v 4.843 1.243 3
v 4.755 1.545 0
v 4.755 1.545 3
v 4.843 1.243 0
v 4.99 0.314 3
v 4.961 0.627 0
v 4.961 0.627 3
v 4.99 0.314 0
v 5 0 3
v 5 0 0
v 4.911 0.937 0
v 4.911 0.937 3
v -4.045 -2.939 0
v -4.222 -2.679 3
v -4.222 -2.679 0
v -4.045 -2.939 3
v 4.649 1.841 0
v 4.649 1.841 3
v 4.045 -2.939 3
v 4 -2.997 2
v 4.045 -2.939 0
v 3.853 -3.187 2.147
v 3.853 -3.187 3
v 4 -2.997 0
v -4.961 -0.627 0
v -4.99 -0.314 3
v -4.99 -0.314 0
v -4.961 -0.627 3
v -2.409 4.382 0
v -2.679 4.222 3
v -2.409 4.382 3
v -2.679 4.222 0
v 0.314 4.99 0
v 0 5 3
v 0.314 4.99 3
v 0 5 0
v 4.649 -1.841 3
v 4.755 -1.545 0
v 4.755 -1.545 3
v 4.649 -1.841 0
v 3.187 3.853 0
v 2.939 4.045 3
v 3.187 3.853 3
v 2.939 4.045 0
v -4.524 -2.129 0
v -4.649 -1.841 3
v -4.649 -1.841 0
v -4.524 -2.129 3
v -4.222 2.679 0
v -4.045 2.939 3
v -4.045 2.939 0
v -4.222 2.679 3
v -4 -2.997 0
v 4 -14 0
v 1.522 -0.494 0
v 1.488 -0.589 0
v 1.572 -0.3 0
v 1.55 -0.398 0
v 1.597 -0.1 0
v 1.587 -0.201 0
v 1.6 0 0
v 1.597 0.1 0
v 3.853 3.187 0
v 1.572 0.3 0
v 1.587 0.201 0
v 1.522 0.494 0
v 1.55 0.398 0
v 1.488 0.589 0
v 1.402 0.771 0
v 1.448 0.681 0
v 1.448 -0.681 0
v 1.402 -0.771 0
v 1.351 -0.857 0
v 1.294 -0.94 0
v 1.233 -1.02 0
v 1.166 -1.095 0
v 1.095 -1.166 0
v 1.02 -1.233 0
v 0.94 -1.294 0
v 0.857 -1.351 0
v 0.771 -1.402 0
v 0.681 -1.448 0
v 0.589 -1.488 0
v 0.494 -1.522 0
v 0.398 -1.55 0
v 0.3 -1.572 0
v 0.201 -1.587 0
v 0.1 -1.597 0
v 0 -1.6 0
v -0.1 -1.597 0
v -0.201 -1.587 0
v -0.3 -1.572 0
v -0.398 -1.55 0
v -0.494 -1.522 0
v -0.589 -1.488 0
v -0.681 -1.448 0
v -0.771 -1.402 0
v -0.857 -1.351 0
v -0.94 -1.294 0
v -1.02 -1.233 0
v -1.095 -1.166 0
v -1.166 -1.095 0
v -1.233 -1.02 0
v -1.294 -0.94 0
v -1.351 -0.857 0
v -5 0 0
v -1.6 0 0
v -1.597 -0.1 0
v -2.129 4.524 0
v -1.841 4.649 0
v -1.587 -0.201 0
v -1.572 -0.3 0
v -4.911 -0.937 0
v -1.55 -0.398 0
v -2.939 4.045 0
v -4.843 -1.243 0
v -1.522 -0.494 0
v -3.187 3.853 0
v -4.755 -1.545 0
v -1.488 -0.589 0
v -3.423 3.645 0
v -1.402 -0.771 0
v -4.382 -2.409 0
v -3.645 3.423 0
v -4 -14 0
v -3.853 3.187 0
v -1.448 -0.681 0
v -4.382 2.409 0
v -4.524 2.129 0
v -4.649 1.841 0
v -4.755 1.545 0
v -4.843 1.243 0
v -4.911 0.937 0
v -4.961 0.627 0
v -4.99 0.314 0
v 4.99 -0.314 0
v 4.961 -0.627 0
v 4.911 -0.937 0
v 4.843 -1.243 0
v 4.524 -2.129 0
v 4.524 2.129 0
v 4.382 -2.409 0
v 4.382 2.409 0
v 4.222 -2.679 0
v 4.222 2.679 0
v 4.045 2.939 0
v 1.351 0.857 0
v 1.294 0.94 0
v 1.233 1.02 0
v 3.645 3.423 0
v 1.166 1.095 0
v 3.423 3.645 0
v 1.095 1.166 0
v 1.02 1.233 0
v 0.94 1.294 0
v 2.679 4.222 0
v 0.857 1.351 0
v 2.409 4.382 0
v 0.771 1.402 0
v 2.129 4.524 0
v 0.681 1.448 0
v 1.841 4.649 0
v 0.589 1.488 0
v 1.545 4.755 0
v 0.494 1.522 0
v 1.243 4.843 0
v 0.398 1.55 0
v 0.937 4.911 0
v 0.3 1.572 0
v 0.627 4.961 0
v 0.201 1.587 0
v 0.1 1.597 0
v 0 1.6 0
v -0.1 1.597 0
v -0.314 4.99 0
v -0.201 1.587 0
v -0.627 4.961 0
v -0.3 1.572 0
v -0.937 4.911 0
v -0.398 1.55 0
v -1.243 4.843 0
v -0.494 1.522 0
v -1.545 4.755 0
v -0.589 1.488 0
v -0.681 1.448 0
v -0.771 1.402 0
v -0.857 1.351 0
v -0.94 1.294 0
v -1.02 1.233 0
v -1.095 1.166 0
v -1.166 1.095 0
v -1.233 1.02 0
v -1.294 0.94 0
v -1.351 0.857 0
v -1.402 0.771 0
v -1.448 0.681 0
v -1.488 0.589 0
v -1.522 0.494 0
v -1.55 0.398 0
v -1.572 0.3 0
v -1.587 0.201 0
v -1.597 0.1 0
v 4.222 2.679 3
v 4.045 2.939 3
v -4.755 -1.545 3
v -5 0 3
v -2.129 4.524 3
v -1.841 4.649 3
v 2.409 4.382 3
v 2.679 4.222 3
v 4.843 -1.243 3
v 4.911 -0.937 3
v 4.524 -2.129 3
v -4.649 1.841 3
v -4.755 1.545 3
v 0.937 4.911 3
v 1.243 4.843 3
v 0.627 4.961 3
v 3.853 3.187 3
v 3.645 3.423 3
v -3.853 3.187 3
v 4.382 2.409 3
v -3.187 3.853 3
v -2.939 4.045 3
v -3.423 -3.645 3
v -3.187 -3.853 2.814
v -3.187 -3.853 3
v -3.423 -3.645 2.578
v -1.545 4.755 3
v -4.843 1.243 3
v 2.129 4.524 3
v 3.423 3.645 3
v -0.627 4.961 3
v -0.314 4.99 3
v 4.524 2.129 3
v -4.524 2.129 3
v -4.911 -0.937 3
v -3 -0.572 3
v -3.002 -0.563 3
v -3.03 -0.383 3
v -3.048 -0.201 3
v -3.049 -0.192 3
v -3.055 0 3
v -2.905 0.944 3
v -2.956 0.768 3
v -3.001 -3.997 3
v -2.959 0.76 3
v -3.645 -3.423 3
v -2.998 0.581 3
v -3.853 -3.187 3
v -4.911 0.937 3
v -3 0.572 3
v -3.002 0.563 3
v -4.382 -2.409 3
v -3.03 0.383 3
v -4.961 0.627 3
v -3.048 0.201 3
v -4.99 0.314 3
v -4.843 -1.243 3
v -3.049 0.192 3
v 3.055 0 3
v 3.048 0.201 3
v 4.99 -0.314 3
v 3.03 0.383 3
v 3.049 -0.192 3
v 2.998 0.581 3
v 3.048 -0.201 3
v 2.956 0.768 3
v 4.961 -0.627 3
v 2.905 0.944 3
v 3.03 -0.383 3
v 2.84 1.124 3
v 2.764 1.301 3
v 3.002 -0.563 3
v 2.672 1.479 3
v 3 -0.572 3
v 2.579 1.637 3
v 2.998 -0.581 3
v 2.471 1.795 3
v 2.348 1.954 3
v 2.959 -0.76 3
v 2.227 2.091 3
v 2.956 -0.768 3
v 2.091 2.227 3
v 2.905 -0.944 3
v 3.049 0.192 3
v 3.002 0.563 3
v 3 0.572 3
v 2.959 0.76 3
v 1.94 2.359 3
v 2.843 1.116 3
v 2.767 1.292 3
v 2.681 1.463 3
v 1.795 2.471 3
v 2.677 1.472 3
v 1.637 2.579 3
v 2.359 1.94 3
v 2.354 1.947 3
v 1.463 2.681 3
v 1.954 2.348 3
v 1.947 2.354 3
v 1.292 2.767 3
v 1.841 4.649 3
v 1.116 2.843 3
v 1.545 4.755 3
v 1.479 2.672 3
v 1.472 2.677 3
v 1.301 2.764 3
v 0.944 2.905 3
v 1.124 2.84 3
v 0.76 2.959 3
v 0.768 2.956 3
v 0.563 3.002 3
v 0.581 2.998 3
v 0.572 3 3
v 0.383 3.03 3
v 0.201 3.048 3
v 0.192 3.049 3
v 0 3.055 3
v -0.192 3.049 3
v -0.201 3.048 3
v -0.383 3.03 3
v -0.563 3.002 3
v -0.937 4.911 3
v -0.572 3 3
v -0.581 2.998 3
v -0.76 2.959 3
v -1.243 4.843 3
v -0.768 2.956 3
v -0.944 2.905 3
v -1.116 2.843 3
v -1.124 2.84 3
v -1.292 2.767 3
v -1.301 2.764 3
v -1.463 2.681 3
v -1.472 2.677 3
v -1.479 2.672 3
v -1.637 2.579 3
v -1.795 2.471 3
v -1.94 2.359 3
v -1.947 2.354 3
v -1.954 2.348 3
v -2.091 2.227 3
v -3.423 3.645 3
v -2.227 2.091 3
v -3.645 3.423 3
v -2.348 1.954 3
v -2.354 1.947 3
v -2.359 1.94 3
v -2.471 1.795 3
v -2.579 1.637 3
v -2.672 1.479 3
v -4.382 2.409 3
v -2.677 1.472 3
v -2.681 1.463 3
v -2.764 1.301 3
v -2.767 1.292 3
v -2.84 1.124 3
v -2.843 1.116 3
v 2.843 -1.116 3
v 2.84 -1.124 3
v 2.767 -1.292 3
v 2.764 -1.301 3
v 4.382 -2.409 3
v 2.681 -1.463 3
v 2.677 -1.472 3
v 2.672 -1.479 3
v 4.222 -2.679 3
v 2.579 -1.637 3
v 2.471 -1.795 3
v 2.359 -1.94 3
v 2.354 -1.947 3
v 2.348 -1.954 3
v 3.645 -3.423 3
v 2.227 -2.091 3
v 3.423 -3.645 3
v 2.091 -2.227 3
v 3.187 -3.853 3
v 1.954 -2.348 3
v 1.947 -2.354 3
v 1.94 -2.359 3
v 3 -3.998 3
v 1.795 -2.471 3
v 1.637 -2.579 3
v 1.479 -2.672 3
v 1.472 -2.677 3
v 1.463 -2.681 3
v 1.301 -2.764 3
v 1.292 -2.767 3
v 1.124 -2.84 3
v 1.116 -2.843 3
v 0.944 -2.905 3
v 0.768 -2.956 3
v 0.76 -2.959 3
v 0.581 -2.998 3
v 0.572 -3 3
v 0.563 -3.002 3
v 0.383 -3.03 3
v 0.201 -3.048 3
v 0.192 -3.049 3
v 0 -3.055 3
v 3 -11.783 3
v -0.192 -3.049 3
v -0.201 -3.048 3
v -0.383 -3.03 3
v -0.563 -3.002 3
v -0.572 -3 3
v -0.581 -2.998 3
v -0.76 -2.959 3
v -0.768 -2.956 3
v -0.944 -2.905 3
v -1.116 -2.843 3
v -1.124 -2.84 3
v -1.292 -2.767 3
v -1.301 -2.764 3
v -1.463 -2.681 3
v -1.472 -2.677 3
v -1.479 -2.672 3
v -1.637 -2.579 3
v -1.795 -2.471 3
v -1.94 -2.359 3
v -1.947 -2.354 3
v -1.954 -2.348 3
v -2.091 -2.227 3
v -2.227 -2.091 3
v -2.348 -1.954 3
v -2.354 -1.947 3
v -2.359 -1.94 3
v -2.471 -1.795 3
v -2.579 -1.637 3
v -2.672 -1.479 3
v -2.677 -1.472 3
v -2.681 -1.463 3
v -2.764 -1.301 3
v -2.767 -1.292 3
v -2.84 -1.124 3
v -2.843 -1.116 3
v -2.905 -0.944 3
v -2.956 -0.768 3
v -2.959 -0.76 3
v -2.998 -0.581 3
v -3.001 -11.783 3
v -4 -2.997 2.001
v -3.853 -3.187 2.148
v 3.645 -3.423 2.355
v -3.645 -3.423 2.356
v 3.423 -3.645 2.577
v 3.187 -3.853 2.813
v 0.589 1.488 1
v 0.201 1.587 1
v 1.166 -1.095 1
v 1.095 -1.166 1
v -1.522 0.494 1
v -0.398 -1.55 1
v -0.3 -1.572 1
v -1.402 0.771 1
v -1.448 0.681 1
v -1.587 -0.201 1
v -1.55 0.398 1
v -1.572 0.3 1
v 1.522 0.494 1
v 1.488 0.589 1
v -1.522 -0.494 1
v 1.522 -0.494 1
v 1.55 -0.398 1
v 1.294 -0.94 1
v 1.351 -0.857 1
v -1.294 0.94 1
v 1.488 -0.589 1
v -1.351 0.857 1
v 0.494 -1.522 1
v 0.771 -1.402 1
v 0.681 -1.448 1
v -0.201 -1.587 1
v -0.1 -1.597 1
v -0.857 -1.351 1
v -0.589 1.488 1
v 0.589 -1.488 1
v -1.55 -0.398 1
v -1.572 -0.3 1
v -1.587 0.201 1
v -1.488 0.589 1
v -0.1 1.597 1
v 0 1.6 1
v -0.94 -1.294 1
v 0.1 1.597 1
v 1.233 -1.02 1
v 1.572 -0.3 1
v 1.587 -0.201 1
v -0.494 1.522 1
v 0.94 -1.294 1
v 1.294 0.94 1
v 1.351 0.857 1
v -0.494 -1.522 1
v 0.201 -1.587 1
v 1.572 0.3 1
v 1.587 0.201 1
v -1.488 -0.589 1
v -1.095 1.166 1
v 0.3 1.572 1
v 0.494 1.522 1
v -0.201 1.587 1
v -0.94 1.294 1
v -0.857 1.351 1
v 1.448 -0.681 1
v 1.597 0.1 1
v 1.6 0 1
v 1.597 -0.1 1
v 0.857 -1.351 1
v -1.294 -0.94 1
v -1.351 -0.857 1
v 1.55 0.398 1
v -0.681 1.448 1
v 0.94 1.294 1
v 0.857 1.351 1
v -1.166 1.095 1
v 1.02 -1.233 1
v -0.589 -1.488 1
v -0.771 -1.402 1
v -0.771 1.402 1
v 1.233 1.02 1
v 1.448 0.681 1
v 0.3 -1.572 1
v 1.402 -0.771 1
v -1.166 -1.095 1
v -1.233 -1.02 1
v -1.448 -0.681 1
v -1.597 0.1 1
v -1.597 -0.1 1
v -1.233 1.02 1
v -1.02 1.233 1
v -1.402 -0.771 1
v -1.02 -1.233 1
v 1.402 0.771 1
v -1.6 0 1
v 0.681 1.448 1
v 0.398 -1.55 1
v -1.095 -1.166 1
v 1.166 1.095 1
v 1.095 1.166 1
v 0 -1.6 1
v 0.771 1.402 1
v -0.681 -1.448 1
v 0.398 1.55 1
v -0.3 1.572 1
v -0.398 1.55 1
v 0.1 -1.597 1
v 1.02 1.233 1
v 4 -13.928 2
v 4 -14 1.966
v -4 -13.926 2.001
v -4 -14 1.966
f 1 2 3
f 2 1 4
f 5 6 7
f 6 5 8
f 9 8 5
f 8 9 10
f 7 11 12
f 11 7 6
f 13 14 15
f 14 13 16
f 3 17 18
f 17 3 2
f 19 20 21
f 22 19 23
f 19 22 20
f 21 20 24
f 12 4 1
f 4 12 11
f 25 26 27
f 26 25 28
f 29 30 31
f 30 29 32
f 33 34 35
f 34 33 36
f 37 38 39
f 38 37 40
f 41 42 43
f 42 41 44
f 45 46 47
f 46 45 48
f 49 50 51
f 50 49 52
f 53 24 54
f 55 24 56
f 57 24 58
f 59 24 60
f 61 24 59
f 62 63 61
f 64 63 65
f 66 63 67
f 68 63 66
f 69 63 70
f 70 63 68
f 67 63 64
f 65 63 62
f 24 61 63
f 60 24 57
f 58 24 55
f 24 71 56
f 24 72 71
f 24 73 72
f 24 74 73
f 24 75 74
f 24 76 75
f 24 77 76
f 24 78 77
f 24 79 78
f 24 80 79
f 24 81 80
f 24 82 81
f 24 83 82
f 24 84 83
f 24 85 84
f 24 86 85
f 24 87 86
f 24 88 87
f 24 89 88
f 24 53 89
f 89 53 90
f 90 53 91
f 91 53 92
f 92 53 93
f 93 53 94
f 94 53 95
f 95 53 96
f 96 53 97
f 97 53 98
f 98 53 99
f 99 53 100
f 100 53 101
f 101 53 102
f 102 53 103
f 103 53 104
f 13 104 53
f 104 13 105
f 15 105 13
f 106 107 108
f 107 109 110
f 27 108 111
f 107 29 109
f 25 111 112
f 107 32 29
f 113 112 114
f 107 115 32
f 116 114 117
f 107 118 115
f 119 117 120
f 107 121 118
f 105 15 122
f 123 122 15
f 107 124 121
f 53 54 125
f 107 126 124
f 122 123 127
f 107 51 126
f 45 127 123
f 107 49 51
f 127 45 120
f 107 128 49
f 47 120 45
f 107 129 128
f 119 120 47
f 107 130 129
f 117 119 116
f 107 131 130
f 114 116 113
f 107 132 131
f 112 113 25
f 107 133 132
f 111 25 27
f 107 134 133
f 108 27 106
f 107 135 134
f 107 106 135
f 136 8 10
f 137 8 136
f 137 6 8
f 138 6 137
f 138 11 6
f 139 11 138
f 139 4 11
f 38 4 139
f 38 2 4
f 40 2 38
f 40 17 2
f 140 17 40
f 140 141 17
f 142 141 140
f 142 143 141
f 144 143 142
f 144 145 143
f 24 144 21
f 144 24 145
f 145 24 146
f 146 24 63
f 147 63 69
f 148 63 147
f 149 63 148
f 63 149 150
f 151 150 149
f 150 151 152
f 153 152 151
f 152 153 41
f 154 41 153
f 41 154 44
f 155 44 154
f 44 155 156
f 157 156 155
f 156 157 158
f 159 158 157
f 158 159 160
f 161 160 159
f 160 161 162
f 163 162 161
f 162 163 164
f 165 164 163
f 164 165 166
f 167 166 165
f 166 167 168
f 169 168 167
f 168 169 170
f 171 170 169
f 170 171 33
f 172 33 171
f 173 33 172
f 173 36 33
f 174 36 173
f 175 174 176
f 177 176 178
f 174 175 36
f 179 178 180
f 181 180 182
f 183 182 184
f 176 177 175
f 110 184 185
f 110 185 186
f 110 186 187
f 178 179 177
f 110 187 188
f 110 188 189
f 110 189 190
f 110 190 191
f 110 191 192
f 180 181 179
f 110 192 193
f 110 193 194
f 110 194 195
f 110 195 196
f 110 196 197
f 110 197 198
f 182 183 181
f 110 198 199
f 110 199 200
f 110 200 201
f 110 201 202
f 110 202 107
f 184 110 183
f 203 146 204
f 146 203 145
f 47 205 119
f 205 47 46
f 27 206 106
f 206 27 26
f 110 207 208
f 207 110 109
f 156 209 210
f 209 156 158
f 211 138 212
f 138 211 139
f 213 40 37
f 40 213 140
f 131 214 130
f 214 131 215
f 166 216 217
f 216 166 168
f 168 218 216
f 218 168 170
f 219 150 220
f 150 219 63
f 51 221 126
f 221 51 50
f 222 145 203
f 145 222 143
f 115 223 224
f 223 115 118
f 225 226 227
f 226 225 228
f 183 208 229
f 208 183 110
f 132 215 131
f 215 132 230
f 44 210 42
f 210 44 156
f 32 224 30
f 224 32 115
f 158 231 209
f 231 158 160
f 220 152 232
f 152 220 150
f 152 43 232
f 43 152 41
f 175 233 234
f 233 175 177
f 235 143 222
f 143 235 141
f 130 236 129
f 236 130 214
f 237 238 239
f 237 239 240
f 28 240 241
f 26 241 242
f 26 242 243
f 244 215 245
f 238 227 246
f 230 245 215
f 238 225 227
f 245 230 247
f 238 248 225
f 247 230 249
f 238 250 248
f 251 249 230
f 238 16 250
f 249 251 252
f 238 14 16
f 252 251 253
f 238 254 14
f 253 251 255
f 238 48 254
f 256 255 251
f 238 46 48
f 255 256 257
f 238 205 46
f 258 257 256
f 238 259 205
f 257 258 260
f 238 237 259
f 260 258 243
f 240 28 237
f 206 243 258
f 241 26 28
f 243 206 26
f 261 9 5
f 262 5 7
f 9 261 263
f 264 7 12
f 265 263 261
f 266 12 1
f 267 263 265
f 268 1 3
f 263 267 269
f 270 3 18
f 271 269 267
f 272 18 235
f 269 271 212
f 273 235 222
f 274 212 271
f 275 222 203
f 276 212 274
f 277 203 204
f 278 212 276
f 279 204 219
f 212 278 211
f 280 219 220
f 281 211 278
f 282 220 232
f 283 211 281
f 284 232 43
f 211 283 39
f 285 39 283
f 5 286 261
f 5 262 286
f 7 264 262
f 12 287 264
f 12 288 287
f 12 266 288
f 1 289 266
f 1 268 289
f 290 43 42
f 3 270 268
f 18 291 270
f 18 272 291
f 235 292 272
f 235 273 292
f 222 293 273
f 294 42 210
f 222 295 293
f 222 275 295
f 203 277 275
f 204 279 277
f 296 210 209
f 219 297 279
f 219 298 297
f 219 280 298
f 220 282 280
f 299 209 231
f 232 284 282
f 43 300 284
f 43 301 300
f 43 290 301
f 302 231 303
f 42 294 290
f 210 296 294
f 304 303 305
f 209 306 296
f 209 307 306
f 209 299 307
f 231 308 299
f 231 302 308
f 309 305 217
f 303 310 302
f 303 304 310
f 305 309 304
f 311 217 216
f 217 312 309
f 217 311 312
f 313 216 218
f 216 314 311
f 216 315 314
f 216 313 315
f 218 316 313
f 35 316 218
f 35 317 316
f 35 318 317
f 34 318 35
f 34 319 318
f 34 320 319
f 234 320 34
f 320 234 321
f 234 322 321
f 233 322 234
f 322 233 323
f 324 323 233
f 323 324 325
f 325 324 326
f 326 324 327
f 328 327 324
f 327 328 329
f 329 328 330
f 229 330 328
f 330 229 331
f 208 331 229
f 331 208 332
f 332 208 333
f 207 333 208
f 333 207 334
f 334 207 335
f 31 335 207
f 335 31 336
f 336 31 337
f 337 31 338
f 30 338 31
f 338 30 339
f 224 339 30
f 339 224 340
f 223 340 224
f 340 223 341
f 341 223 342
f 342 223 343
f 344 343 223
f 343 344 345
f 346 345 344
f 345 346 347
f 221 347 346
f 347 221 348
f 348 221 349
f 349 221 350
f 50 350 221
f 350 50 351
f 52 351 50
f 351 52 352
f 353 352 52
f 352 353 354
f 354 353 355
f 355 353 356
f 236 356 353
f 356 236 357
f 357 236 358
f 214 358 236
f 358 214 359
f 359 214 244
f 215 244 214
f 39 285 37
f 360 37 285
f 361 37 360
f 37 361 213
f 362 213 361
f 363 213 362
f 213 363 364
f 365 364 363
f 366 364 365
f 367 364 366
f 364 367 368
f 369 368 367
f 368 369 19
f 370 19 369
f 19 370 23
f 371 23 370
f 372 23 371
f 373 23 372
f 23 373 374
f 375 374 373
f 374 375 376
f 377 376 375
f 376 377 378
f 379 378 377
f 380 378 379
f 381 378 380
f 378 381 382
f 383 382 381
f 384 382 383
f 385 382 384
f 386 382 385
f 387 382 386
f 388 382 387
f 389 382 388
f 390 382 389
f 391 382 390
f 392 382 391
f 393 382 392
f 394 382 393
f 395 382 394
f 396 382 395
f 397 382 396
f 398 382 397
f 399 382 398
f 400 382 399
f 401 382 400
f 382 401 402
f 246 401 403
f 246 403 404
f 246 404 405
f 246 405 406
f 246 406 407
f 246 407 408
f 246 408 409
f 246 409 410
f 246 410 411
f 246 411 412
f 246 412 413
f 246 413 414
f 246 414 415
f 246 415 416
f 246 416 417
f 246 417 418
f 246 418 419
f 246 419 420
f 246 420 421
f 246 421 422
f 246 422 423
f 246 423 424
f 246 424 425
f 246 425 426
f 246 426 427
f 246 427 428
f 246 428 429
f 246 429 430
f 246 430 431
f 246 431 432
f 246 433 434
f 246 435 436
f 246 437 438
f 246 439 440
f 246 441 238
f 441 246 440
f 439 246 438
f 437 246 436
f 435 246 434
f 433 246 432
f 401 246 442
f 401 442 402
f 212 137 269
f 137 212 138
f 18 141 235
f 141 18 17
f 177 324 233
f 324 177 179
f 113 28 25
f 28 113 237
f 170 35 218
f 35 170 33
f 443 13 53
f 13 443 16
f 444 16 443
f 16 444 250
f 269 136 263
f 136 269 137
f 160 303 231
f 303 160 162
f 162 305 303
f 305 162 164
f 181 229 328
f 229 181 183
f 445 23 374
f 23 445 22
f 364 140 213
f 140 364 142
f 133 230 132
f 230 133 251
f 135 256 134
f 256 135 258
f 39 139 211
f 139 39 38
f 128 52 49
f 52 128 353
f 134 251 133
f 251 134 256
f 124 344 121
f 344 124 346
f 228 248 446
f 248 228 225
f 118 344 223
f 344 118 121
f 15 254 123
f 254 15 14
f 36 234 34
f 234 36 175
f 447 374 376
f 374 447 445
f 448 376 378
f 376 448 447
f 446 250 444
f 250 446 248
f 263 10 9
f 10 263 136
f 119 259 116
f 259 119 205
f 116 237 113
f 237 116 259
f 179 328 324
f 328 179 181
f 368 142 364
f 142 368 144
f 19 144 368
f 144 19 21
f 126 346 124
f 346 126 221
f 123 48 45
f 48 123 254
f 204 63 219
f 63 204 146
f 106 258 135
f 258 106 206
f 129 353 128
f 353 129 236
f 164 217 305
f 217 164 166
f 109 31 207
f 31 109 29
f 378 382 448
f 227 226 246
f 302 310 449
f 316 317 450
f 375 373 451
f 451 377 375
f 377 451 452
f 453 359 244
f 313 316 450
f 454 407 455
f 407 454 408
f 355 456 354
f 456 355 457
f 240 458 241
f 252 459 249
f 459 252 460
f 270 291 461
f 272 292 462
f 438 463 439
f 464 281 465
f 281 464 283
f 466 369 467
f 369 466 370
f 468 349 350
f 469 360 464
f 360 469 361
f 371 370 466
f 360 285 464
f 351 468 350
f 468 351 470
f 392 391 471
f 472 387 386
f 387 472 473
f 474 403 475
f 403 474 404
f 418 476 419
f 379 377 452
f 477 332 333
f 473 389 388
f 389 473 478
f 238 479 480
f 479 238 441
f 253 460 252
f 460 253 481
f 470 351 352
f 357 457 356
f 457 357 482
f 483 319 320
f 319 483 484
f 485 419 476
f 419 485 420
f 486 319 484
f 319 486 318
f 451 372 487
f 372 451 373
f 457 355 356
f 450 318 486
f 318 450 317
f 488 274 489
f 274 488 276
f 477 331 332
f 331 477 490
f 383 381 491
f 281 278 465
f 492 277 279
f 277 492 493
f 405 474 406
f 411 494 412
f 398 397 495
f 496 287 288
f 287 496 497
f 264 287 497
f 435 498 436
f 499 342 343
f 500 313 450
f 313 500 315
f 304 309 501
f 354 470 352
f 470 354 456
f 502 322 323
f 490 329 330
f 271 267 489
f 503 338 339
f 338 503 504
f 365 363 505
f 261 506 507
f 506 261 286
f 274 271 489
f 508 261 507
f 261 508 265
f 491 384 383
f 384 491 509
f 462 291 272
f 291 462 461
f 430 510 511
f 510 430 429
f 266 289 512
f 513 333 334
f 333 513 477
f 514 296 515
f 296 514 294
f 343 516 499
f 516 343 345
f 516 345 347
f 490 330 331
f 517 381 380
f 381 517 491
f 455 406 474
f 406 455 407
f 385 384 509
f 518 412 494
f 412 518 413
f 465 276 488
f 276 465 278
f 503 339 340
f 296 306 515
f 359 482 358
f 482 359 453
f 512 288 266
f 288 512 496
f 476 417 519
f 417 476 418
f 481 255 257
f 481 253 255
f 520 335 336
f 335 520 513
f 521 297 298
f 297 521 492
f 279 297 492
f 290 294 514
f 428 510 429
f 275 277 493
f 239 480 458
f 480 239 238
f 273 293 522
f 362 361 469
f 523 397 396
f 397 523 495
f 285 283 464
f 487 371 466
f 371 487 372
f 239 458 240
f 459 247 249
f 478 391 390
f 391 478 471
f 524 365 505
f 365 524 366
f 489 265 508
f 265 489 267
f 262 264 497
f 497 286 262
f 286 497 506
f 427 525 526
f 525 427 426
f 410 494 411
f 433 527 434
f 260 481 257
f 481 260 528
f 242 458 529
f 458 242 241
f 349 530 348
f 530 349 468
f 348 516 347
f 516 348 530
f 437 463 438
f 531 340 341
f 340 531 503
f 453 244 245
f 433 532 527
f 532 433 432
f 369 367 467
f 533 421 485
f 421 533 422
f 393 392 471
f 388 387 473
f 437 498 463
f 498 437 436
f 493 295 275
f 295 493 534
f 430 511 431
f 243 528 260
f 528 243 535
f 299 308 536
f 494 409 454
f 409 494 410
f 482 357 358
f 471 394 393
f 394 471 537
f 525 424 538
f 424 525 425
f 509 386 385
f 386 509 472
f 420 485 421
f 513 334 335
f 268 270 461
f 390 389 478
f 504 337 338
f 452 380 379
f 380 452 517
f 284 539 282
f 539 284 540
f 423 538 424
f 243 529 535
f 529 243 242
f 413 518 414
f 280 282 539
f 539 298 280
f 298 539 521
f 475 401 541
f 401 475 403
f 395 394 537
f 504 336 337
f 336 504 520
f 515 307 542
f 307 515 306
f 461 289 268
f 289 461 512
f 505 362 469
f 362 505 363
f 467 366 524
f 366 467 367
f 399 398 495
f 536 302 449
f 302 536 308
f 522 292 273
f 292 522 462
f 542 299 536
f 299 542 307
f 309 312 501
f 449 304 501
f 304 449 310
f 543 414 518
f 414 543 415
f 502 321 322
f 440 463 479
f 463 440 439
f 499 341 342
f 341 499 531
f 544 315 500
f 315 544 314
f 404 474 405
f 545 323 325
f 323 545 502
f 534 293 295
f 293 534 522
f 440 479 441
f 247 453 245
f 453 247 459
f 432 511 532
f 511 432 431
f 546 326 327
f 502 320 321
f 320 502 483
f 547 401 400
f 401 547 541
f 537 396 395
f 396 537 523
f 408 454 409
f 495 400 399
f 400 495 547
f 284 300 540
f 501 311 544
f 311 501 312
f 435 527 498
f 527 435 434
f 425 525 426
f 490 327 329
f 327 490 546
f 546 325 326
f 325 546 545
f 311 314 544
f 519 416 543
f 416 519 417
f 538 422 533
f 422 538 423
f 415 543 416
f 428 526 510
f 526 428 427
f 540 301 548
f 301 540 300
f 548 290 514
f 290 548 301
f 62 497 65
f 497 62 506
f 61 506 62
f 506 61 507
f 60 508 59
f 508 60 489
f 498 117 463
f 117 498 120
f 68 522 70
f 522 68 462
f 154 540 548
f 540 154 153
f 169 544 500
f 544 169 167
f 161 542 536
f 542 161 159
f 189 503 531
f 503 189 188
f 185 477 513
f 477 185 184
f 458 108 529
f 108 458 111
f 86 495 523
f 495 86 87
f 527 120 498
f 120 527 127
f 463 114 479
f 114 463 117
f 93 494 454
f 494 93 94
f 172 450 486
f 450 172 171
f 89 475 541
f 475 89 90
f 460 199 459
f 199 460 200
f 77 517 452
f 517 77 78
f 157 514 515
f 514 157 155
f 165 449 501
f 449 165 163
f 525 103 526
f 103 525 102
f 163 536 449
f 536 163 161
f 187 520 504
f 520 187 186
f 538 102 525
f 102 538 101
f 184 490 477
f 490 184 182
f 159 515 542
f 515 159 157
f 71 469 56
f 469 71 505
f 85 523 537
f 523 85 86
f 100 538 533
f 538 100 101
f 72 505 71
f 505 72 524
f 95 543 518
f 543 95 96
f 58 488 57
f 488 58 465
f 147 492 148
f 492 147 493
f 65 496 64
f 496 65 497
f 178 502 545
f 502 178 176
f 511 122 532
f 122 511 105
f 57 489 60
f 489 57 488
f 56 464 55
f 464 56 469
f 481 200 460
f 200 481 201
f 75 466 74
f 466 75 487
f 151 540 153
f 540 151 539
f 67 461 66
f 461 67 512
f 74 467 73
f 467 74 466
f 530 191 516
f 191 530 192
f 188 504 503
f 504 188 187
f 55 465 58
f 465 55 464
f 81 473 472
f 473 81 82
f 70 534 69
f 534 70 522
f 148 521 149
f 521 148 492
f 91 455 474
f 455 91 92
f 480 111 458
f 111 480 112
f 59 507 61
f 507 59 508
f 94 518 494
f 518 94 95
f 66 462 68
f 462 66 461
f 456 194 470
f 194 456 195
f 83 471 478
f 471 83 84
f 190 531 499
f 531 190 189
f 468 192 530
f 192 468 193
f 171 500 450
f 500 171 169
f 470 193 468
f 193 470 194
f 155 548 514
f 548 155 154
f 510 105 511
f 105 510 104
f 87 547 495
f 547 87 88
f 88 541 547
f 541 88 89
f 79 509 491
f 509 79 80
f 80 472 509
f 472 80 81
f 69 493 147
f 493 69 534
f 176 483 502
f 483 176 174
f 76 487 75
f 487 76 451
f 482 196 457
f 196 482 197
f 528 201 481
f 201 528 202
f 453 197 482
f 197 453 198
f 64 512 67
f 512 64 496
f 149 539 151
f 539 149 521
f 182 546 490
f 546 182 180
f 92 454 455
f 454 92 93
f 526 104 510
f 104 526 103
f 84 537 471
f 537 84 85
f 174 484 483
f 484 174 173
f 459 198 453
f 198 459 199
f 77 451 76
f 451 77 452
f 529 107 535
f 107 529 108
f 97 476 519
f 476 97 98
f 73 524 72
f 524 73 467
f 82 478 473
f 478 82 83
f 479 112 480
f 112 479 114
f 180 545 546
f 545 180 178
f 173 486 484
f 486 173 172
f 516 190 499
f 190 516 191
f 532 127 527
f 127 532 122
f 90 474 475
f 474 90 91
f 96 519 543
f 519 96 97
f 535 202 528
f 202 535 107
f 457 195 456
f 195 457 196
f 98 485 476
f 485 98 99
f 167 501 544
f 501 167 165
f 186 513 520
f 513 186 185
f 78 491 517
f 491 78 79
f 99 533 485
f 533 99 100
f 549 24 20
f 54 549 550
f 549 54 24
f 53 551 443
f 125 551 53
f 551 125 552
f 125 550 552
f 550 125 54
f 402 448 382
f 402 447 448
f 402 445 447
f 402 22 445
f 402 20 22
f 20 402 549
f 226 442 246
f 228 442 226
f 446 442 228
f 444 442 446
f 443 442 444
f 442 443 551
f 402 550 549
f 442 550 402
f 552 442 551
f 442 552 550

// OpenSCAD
w=8;        //key width, default 8
wc=10;      //mounting end outer diameter, default 10
l=15;       //key length (range normally increase in steps of 5)
hght=3;     //key height, default 3,3.5 and 4
angl=25;    //key end angle, default 25
estp=1.5;    //end step before angle, default 0.5
noext=0;    //set to 1 to get just the round part   

// 20/3,26/3.5,32/4 sk: 15/3 (estp 1.5)

 module prism(l, w, h){
       polyhedron(
               points=[[0,0,0], [l,0,0], [l,w,0], [0,w,0], [0,w,h], [l,w,h]],
               faces=[[0,1,2,3],[5,4,3,2],[0,4,5,1],[0,3,4],[5,2,1]]
               );
   }    
  
difference(){
    translate([0,0,0]) cylinder(h=hght,r=wc/2,,$fn=100);
    translate([0,0,hght-2]) cylinder(h=2.2,r1=1.6,r2=3.2,$fn=100);
    translate([0,0,-1]) cylinder(h=hght+5,r=1.6,$fn=100);
    //translate([-8,-8,0]) cube([16,2,3]);
    
}
if (!noext){
difference(){
    translate([-w/2,-l+1,0]) cube([w,l,hght]);
    translate([0,0,hght-2]) cylinder(h=2.2,r1=1.6,r2=3.2,$fn=100);
    translate([0,0,-1]) cylinder(h=hght+5,r=1.6,$fn=100); 
    translate([w/2-1,-l,hght]) rotate([180,0,90]) prism(l,1,1);  
    translate([-w/2-0.001,-l,hght-1]) rotate([90,0,90]) prism(l,1,1); 
    //translate([-w/2,-l+5.5,hght]) rotate([160,0,0])prism(w,15,15);
    translate([-w/2,-l,estp]) rotate([angl,0,0])cube(40,40,40);
}
}
